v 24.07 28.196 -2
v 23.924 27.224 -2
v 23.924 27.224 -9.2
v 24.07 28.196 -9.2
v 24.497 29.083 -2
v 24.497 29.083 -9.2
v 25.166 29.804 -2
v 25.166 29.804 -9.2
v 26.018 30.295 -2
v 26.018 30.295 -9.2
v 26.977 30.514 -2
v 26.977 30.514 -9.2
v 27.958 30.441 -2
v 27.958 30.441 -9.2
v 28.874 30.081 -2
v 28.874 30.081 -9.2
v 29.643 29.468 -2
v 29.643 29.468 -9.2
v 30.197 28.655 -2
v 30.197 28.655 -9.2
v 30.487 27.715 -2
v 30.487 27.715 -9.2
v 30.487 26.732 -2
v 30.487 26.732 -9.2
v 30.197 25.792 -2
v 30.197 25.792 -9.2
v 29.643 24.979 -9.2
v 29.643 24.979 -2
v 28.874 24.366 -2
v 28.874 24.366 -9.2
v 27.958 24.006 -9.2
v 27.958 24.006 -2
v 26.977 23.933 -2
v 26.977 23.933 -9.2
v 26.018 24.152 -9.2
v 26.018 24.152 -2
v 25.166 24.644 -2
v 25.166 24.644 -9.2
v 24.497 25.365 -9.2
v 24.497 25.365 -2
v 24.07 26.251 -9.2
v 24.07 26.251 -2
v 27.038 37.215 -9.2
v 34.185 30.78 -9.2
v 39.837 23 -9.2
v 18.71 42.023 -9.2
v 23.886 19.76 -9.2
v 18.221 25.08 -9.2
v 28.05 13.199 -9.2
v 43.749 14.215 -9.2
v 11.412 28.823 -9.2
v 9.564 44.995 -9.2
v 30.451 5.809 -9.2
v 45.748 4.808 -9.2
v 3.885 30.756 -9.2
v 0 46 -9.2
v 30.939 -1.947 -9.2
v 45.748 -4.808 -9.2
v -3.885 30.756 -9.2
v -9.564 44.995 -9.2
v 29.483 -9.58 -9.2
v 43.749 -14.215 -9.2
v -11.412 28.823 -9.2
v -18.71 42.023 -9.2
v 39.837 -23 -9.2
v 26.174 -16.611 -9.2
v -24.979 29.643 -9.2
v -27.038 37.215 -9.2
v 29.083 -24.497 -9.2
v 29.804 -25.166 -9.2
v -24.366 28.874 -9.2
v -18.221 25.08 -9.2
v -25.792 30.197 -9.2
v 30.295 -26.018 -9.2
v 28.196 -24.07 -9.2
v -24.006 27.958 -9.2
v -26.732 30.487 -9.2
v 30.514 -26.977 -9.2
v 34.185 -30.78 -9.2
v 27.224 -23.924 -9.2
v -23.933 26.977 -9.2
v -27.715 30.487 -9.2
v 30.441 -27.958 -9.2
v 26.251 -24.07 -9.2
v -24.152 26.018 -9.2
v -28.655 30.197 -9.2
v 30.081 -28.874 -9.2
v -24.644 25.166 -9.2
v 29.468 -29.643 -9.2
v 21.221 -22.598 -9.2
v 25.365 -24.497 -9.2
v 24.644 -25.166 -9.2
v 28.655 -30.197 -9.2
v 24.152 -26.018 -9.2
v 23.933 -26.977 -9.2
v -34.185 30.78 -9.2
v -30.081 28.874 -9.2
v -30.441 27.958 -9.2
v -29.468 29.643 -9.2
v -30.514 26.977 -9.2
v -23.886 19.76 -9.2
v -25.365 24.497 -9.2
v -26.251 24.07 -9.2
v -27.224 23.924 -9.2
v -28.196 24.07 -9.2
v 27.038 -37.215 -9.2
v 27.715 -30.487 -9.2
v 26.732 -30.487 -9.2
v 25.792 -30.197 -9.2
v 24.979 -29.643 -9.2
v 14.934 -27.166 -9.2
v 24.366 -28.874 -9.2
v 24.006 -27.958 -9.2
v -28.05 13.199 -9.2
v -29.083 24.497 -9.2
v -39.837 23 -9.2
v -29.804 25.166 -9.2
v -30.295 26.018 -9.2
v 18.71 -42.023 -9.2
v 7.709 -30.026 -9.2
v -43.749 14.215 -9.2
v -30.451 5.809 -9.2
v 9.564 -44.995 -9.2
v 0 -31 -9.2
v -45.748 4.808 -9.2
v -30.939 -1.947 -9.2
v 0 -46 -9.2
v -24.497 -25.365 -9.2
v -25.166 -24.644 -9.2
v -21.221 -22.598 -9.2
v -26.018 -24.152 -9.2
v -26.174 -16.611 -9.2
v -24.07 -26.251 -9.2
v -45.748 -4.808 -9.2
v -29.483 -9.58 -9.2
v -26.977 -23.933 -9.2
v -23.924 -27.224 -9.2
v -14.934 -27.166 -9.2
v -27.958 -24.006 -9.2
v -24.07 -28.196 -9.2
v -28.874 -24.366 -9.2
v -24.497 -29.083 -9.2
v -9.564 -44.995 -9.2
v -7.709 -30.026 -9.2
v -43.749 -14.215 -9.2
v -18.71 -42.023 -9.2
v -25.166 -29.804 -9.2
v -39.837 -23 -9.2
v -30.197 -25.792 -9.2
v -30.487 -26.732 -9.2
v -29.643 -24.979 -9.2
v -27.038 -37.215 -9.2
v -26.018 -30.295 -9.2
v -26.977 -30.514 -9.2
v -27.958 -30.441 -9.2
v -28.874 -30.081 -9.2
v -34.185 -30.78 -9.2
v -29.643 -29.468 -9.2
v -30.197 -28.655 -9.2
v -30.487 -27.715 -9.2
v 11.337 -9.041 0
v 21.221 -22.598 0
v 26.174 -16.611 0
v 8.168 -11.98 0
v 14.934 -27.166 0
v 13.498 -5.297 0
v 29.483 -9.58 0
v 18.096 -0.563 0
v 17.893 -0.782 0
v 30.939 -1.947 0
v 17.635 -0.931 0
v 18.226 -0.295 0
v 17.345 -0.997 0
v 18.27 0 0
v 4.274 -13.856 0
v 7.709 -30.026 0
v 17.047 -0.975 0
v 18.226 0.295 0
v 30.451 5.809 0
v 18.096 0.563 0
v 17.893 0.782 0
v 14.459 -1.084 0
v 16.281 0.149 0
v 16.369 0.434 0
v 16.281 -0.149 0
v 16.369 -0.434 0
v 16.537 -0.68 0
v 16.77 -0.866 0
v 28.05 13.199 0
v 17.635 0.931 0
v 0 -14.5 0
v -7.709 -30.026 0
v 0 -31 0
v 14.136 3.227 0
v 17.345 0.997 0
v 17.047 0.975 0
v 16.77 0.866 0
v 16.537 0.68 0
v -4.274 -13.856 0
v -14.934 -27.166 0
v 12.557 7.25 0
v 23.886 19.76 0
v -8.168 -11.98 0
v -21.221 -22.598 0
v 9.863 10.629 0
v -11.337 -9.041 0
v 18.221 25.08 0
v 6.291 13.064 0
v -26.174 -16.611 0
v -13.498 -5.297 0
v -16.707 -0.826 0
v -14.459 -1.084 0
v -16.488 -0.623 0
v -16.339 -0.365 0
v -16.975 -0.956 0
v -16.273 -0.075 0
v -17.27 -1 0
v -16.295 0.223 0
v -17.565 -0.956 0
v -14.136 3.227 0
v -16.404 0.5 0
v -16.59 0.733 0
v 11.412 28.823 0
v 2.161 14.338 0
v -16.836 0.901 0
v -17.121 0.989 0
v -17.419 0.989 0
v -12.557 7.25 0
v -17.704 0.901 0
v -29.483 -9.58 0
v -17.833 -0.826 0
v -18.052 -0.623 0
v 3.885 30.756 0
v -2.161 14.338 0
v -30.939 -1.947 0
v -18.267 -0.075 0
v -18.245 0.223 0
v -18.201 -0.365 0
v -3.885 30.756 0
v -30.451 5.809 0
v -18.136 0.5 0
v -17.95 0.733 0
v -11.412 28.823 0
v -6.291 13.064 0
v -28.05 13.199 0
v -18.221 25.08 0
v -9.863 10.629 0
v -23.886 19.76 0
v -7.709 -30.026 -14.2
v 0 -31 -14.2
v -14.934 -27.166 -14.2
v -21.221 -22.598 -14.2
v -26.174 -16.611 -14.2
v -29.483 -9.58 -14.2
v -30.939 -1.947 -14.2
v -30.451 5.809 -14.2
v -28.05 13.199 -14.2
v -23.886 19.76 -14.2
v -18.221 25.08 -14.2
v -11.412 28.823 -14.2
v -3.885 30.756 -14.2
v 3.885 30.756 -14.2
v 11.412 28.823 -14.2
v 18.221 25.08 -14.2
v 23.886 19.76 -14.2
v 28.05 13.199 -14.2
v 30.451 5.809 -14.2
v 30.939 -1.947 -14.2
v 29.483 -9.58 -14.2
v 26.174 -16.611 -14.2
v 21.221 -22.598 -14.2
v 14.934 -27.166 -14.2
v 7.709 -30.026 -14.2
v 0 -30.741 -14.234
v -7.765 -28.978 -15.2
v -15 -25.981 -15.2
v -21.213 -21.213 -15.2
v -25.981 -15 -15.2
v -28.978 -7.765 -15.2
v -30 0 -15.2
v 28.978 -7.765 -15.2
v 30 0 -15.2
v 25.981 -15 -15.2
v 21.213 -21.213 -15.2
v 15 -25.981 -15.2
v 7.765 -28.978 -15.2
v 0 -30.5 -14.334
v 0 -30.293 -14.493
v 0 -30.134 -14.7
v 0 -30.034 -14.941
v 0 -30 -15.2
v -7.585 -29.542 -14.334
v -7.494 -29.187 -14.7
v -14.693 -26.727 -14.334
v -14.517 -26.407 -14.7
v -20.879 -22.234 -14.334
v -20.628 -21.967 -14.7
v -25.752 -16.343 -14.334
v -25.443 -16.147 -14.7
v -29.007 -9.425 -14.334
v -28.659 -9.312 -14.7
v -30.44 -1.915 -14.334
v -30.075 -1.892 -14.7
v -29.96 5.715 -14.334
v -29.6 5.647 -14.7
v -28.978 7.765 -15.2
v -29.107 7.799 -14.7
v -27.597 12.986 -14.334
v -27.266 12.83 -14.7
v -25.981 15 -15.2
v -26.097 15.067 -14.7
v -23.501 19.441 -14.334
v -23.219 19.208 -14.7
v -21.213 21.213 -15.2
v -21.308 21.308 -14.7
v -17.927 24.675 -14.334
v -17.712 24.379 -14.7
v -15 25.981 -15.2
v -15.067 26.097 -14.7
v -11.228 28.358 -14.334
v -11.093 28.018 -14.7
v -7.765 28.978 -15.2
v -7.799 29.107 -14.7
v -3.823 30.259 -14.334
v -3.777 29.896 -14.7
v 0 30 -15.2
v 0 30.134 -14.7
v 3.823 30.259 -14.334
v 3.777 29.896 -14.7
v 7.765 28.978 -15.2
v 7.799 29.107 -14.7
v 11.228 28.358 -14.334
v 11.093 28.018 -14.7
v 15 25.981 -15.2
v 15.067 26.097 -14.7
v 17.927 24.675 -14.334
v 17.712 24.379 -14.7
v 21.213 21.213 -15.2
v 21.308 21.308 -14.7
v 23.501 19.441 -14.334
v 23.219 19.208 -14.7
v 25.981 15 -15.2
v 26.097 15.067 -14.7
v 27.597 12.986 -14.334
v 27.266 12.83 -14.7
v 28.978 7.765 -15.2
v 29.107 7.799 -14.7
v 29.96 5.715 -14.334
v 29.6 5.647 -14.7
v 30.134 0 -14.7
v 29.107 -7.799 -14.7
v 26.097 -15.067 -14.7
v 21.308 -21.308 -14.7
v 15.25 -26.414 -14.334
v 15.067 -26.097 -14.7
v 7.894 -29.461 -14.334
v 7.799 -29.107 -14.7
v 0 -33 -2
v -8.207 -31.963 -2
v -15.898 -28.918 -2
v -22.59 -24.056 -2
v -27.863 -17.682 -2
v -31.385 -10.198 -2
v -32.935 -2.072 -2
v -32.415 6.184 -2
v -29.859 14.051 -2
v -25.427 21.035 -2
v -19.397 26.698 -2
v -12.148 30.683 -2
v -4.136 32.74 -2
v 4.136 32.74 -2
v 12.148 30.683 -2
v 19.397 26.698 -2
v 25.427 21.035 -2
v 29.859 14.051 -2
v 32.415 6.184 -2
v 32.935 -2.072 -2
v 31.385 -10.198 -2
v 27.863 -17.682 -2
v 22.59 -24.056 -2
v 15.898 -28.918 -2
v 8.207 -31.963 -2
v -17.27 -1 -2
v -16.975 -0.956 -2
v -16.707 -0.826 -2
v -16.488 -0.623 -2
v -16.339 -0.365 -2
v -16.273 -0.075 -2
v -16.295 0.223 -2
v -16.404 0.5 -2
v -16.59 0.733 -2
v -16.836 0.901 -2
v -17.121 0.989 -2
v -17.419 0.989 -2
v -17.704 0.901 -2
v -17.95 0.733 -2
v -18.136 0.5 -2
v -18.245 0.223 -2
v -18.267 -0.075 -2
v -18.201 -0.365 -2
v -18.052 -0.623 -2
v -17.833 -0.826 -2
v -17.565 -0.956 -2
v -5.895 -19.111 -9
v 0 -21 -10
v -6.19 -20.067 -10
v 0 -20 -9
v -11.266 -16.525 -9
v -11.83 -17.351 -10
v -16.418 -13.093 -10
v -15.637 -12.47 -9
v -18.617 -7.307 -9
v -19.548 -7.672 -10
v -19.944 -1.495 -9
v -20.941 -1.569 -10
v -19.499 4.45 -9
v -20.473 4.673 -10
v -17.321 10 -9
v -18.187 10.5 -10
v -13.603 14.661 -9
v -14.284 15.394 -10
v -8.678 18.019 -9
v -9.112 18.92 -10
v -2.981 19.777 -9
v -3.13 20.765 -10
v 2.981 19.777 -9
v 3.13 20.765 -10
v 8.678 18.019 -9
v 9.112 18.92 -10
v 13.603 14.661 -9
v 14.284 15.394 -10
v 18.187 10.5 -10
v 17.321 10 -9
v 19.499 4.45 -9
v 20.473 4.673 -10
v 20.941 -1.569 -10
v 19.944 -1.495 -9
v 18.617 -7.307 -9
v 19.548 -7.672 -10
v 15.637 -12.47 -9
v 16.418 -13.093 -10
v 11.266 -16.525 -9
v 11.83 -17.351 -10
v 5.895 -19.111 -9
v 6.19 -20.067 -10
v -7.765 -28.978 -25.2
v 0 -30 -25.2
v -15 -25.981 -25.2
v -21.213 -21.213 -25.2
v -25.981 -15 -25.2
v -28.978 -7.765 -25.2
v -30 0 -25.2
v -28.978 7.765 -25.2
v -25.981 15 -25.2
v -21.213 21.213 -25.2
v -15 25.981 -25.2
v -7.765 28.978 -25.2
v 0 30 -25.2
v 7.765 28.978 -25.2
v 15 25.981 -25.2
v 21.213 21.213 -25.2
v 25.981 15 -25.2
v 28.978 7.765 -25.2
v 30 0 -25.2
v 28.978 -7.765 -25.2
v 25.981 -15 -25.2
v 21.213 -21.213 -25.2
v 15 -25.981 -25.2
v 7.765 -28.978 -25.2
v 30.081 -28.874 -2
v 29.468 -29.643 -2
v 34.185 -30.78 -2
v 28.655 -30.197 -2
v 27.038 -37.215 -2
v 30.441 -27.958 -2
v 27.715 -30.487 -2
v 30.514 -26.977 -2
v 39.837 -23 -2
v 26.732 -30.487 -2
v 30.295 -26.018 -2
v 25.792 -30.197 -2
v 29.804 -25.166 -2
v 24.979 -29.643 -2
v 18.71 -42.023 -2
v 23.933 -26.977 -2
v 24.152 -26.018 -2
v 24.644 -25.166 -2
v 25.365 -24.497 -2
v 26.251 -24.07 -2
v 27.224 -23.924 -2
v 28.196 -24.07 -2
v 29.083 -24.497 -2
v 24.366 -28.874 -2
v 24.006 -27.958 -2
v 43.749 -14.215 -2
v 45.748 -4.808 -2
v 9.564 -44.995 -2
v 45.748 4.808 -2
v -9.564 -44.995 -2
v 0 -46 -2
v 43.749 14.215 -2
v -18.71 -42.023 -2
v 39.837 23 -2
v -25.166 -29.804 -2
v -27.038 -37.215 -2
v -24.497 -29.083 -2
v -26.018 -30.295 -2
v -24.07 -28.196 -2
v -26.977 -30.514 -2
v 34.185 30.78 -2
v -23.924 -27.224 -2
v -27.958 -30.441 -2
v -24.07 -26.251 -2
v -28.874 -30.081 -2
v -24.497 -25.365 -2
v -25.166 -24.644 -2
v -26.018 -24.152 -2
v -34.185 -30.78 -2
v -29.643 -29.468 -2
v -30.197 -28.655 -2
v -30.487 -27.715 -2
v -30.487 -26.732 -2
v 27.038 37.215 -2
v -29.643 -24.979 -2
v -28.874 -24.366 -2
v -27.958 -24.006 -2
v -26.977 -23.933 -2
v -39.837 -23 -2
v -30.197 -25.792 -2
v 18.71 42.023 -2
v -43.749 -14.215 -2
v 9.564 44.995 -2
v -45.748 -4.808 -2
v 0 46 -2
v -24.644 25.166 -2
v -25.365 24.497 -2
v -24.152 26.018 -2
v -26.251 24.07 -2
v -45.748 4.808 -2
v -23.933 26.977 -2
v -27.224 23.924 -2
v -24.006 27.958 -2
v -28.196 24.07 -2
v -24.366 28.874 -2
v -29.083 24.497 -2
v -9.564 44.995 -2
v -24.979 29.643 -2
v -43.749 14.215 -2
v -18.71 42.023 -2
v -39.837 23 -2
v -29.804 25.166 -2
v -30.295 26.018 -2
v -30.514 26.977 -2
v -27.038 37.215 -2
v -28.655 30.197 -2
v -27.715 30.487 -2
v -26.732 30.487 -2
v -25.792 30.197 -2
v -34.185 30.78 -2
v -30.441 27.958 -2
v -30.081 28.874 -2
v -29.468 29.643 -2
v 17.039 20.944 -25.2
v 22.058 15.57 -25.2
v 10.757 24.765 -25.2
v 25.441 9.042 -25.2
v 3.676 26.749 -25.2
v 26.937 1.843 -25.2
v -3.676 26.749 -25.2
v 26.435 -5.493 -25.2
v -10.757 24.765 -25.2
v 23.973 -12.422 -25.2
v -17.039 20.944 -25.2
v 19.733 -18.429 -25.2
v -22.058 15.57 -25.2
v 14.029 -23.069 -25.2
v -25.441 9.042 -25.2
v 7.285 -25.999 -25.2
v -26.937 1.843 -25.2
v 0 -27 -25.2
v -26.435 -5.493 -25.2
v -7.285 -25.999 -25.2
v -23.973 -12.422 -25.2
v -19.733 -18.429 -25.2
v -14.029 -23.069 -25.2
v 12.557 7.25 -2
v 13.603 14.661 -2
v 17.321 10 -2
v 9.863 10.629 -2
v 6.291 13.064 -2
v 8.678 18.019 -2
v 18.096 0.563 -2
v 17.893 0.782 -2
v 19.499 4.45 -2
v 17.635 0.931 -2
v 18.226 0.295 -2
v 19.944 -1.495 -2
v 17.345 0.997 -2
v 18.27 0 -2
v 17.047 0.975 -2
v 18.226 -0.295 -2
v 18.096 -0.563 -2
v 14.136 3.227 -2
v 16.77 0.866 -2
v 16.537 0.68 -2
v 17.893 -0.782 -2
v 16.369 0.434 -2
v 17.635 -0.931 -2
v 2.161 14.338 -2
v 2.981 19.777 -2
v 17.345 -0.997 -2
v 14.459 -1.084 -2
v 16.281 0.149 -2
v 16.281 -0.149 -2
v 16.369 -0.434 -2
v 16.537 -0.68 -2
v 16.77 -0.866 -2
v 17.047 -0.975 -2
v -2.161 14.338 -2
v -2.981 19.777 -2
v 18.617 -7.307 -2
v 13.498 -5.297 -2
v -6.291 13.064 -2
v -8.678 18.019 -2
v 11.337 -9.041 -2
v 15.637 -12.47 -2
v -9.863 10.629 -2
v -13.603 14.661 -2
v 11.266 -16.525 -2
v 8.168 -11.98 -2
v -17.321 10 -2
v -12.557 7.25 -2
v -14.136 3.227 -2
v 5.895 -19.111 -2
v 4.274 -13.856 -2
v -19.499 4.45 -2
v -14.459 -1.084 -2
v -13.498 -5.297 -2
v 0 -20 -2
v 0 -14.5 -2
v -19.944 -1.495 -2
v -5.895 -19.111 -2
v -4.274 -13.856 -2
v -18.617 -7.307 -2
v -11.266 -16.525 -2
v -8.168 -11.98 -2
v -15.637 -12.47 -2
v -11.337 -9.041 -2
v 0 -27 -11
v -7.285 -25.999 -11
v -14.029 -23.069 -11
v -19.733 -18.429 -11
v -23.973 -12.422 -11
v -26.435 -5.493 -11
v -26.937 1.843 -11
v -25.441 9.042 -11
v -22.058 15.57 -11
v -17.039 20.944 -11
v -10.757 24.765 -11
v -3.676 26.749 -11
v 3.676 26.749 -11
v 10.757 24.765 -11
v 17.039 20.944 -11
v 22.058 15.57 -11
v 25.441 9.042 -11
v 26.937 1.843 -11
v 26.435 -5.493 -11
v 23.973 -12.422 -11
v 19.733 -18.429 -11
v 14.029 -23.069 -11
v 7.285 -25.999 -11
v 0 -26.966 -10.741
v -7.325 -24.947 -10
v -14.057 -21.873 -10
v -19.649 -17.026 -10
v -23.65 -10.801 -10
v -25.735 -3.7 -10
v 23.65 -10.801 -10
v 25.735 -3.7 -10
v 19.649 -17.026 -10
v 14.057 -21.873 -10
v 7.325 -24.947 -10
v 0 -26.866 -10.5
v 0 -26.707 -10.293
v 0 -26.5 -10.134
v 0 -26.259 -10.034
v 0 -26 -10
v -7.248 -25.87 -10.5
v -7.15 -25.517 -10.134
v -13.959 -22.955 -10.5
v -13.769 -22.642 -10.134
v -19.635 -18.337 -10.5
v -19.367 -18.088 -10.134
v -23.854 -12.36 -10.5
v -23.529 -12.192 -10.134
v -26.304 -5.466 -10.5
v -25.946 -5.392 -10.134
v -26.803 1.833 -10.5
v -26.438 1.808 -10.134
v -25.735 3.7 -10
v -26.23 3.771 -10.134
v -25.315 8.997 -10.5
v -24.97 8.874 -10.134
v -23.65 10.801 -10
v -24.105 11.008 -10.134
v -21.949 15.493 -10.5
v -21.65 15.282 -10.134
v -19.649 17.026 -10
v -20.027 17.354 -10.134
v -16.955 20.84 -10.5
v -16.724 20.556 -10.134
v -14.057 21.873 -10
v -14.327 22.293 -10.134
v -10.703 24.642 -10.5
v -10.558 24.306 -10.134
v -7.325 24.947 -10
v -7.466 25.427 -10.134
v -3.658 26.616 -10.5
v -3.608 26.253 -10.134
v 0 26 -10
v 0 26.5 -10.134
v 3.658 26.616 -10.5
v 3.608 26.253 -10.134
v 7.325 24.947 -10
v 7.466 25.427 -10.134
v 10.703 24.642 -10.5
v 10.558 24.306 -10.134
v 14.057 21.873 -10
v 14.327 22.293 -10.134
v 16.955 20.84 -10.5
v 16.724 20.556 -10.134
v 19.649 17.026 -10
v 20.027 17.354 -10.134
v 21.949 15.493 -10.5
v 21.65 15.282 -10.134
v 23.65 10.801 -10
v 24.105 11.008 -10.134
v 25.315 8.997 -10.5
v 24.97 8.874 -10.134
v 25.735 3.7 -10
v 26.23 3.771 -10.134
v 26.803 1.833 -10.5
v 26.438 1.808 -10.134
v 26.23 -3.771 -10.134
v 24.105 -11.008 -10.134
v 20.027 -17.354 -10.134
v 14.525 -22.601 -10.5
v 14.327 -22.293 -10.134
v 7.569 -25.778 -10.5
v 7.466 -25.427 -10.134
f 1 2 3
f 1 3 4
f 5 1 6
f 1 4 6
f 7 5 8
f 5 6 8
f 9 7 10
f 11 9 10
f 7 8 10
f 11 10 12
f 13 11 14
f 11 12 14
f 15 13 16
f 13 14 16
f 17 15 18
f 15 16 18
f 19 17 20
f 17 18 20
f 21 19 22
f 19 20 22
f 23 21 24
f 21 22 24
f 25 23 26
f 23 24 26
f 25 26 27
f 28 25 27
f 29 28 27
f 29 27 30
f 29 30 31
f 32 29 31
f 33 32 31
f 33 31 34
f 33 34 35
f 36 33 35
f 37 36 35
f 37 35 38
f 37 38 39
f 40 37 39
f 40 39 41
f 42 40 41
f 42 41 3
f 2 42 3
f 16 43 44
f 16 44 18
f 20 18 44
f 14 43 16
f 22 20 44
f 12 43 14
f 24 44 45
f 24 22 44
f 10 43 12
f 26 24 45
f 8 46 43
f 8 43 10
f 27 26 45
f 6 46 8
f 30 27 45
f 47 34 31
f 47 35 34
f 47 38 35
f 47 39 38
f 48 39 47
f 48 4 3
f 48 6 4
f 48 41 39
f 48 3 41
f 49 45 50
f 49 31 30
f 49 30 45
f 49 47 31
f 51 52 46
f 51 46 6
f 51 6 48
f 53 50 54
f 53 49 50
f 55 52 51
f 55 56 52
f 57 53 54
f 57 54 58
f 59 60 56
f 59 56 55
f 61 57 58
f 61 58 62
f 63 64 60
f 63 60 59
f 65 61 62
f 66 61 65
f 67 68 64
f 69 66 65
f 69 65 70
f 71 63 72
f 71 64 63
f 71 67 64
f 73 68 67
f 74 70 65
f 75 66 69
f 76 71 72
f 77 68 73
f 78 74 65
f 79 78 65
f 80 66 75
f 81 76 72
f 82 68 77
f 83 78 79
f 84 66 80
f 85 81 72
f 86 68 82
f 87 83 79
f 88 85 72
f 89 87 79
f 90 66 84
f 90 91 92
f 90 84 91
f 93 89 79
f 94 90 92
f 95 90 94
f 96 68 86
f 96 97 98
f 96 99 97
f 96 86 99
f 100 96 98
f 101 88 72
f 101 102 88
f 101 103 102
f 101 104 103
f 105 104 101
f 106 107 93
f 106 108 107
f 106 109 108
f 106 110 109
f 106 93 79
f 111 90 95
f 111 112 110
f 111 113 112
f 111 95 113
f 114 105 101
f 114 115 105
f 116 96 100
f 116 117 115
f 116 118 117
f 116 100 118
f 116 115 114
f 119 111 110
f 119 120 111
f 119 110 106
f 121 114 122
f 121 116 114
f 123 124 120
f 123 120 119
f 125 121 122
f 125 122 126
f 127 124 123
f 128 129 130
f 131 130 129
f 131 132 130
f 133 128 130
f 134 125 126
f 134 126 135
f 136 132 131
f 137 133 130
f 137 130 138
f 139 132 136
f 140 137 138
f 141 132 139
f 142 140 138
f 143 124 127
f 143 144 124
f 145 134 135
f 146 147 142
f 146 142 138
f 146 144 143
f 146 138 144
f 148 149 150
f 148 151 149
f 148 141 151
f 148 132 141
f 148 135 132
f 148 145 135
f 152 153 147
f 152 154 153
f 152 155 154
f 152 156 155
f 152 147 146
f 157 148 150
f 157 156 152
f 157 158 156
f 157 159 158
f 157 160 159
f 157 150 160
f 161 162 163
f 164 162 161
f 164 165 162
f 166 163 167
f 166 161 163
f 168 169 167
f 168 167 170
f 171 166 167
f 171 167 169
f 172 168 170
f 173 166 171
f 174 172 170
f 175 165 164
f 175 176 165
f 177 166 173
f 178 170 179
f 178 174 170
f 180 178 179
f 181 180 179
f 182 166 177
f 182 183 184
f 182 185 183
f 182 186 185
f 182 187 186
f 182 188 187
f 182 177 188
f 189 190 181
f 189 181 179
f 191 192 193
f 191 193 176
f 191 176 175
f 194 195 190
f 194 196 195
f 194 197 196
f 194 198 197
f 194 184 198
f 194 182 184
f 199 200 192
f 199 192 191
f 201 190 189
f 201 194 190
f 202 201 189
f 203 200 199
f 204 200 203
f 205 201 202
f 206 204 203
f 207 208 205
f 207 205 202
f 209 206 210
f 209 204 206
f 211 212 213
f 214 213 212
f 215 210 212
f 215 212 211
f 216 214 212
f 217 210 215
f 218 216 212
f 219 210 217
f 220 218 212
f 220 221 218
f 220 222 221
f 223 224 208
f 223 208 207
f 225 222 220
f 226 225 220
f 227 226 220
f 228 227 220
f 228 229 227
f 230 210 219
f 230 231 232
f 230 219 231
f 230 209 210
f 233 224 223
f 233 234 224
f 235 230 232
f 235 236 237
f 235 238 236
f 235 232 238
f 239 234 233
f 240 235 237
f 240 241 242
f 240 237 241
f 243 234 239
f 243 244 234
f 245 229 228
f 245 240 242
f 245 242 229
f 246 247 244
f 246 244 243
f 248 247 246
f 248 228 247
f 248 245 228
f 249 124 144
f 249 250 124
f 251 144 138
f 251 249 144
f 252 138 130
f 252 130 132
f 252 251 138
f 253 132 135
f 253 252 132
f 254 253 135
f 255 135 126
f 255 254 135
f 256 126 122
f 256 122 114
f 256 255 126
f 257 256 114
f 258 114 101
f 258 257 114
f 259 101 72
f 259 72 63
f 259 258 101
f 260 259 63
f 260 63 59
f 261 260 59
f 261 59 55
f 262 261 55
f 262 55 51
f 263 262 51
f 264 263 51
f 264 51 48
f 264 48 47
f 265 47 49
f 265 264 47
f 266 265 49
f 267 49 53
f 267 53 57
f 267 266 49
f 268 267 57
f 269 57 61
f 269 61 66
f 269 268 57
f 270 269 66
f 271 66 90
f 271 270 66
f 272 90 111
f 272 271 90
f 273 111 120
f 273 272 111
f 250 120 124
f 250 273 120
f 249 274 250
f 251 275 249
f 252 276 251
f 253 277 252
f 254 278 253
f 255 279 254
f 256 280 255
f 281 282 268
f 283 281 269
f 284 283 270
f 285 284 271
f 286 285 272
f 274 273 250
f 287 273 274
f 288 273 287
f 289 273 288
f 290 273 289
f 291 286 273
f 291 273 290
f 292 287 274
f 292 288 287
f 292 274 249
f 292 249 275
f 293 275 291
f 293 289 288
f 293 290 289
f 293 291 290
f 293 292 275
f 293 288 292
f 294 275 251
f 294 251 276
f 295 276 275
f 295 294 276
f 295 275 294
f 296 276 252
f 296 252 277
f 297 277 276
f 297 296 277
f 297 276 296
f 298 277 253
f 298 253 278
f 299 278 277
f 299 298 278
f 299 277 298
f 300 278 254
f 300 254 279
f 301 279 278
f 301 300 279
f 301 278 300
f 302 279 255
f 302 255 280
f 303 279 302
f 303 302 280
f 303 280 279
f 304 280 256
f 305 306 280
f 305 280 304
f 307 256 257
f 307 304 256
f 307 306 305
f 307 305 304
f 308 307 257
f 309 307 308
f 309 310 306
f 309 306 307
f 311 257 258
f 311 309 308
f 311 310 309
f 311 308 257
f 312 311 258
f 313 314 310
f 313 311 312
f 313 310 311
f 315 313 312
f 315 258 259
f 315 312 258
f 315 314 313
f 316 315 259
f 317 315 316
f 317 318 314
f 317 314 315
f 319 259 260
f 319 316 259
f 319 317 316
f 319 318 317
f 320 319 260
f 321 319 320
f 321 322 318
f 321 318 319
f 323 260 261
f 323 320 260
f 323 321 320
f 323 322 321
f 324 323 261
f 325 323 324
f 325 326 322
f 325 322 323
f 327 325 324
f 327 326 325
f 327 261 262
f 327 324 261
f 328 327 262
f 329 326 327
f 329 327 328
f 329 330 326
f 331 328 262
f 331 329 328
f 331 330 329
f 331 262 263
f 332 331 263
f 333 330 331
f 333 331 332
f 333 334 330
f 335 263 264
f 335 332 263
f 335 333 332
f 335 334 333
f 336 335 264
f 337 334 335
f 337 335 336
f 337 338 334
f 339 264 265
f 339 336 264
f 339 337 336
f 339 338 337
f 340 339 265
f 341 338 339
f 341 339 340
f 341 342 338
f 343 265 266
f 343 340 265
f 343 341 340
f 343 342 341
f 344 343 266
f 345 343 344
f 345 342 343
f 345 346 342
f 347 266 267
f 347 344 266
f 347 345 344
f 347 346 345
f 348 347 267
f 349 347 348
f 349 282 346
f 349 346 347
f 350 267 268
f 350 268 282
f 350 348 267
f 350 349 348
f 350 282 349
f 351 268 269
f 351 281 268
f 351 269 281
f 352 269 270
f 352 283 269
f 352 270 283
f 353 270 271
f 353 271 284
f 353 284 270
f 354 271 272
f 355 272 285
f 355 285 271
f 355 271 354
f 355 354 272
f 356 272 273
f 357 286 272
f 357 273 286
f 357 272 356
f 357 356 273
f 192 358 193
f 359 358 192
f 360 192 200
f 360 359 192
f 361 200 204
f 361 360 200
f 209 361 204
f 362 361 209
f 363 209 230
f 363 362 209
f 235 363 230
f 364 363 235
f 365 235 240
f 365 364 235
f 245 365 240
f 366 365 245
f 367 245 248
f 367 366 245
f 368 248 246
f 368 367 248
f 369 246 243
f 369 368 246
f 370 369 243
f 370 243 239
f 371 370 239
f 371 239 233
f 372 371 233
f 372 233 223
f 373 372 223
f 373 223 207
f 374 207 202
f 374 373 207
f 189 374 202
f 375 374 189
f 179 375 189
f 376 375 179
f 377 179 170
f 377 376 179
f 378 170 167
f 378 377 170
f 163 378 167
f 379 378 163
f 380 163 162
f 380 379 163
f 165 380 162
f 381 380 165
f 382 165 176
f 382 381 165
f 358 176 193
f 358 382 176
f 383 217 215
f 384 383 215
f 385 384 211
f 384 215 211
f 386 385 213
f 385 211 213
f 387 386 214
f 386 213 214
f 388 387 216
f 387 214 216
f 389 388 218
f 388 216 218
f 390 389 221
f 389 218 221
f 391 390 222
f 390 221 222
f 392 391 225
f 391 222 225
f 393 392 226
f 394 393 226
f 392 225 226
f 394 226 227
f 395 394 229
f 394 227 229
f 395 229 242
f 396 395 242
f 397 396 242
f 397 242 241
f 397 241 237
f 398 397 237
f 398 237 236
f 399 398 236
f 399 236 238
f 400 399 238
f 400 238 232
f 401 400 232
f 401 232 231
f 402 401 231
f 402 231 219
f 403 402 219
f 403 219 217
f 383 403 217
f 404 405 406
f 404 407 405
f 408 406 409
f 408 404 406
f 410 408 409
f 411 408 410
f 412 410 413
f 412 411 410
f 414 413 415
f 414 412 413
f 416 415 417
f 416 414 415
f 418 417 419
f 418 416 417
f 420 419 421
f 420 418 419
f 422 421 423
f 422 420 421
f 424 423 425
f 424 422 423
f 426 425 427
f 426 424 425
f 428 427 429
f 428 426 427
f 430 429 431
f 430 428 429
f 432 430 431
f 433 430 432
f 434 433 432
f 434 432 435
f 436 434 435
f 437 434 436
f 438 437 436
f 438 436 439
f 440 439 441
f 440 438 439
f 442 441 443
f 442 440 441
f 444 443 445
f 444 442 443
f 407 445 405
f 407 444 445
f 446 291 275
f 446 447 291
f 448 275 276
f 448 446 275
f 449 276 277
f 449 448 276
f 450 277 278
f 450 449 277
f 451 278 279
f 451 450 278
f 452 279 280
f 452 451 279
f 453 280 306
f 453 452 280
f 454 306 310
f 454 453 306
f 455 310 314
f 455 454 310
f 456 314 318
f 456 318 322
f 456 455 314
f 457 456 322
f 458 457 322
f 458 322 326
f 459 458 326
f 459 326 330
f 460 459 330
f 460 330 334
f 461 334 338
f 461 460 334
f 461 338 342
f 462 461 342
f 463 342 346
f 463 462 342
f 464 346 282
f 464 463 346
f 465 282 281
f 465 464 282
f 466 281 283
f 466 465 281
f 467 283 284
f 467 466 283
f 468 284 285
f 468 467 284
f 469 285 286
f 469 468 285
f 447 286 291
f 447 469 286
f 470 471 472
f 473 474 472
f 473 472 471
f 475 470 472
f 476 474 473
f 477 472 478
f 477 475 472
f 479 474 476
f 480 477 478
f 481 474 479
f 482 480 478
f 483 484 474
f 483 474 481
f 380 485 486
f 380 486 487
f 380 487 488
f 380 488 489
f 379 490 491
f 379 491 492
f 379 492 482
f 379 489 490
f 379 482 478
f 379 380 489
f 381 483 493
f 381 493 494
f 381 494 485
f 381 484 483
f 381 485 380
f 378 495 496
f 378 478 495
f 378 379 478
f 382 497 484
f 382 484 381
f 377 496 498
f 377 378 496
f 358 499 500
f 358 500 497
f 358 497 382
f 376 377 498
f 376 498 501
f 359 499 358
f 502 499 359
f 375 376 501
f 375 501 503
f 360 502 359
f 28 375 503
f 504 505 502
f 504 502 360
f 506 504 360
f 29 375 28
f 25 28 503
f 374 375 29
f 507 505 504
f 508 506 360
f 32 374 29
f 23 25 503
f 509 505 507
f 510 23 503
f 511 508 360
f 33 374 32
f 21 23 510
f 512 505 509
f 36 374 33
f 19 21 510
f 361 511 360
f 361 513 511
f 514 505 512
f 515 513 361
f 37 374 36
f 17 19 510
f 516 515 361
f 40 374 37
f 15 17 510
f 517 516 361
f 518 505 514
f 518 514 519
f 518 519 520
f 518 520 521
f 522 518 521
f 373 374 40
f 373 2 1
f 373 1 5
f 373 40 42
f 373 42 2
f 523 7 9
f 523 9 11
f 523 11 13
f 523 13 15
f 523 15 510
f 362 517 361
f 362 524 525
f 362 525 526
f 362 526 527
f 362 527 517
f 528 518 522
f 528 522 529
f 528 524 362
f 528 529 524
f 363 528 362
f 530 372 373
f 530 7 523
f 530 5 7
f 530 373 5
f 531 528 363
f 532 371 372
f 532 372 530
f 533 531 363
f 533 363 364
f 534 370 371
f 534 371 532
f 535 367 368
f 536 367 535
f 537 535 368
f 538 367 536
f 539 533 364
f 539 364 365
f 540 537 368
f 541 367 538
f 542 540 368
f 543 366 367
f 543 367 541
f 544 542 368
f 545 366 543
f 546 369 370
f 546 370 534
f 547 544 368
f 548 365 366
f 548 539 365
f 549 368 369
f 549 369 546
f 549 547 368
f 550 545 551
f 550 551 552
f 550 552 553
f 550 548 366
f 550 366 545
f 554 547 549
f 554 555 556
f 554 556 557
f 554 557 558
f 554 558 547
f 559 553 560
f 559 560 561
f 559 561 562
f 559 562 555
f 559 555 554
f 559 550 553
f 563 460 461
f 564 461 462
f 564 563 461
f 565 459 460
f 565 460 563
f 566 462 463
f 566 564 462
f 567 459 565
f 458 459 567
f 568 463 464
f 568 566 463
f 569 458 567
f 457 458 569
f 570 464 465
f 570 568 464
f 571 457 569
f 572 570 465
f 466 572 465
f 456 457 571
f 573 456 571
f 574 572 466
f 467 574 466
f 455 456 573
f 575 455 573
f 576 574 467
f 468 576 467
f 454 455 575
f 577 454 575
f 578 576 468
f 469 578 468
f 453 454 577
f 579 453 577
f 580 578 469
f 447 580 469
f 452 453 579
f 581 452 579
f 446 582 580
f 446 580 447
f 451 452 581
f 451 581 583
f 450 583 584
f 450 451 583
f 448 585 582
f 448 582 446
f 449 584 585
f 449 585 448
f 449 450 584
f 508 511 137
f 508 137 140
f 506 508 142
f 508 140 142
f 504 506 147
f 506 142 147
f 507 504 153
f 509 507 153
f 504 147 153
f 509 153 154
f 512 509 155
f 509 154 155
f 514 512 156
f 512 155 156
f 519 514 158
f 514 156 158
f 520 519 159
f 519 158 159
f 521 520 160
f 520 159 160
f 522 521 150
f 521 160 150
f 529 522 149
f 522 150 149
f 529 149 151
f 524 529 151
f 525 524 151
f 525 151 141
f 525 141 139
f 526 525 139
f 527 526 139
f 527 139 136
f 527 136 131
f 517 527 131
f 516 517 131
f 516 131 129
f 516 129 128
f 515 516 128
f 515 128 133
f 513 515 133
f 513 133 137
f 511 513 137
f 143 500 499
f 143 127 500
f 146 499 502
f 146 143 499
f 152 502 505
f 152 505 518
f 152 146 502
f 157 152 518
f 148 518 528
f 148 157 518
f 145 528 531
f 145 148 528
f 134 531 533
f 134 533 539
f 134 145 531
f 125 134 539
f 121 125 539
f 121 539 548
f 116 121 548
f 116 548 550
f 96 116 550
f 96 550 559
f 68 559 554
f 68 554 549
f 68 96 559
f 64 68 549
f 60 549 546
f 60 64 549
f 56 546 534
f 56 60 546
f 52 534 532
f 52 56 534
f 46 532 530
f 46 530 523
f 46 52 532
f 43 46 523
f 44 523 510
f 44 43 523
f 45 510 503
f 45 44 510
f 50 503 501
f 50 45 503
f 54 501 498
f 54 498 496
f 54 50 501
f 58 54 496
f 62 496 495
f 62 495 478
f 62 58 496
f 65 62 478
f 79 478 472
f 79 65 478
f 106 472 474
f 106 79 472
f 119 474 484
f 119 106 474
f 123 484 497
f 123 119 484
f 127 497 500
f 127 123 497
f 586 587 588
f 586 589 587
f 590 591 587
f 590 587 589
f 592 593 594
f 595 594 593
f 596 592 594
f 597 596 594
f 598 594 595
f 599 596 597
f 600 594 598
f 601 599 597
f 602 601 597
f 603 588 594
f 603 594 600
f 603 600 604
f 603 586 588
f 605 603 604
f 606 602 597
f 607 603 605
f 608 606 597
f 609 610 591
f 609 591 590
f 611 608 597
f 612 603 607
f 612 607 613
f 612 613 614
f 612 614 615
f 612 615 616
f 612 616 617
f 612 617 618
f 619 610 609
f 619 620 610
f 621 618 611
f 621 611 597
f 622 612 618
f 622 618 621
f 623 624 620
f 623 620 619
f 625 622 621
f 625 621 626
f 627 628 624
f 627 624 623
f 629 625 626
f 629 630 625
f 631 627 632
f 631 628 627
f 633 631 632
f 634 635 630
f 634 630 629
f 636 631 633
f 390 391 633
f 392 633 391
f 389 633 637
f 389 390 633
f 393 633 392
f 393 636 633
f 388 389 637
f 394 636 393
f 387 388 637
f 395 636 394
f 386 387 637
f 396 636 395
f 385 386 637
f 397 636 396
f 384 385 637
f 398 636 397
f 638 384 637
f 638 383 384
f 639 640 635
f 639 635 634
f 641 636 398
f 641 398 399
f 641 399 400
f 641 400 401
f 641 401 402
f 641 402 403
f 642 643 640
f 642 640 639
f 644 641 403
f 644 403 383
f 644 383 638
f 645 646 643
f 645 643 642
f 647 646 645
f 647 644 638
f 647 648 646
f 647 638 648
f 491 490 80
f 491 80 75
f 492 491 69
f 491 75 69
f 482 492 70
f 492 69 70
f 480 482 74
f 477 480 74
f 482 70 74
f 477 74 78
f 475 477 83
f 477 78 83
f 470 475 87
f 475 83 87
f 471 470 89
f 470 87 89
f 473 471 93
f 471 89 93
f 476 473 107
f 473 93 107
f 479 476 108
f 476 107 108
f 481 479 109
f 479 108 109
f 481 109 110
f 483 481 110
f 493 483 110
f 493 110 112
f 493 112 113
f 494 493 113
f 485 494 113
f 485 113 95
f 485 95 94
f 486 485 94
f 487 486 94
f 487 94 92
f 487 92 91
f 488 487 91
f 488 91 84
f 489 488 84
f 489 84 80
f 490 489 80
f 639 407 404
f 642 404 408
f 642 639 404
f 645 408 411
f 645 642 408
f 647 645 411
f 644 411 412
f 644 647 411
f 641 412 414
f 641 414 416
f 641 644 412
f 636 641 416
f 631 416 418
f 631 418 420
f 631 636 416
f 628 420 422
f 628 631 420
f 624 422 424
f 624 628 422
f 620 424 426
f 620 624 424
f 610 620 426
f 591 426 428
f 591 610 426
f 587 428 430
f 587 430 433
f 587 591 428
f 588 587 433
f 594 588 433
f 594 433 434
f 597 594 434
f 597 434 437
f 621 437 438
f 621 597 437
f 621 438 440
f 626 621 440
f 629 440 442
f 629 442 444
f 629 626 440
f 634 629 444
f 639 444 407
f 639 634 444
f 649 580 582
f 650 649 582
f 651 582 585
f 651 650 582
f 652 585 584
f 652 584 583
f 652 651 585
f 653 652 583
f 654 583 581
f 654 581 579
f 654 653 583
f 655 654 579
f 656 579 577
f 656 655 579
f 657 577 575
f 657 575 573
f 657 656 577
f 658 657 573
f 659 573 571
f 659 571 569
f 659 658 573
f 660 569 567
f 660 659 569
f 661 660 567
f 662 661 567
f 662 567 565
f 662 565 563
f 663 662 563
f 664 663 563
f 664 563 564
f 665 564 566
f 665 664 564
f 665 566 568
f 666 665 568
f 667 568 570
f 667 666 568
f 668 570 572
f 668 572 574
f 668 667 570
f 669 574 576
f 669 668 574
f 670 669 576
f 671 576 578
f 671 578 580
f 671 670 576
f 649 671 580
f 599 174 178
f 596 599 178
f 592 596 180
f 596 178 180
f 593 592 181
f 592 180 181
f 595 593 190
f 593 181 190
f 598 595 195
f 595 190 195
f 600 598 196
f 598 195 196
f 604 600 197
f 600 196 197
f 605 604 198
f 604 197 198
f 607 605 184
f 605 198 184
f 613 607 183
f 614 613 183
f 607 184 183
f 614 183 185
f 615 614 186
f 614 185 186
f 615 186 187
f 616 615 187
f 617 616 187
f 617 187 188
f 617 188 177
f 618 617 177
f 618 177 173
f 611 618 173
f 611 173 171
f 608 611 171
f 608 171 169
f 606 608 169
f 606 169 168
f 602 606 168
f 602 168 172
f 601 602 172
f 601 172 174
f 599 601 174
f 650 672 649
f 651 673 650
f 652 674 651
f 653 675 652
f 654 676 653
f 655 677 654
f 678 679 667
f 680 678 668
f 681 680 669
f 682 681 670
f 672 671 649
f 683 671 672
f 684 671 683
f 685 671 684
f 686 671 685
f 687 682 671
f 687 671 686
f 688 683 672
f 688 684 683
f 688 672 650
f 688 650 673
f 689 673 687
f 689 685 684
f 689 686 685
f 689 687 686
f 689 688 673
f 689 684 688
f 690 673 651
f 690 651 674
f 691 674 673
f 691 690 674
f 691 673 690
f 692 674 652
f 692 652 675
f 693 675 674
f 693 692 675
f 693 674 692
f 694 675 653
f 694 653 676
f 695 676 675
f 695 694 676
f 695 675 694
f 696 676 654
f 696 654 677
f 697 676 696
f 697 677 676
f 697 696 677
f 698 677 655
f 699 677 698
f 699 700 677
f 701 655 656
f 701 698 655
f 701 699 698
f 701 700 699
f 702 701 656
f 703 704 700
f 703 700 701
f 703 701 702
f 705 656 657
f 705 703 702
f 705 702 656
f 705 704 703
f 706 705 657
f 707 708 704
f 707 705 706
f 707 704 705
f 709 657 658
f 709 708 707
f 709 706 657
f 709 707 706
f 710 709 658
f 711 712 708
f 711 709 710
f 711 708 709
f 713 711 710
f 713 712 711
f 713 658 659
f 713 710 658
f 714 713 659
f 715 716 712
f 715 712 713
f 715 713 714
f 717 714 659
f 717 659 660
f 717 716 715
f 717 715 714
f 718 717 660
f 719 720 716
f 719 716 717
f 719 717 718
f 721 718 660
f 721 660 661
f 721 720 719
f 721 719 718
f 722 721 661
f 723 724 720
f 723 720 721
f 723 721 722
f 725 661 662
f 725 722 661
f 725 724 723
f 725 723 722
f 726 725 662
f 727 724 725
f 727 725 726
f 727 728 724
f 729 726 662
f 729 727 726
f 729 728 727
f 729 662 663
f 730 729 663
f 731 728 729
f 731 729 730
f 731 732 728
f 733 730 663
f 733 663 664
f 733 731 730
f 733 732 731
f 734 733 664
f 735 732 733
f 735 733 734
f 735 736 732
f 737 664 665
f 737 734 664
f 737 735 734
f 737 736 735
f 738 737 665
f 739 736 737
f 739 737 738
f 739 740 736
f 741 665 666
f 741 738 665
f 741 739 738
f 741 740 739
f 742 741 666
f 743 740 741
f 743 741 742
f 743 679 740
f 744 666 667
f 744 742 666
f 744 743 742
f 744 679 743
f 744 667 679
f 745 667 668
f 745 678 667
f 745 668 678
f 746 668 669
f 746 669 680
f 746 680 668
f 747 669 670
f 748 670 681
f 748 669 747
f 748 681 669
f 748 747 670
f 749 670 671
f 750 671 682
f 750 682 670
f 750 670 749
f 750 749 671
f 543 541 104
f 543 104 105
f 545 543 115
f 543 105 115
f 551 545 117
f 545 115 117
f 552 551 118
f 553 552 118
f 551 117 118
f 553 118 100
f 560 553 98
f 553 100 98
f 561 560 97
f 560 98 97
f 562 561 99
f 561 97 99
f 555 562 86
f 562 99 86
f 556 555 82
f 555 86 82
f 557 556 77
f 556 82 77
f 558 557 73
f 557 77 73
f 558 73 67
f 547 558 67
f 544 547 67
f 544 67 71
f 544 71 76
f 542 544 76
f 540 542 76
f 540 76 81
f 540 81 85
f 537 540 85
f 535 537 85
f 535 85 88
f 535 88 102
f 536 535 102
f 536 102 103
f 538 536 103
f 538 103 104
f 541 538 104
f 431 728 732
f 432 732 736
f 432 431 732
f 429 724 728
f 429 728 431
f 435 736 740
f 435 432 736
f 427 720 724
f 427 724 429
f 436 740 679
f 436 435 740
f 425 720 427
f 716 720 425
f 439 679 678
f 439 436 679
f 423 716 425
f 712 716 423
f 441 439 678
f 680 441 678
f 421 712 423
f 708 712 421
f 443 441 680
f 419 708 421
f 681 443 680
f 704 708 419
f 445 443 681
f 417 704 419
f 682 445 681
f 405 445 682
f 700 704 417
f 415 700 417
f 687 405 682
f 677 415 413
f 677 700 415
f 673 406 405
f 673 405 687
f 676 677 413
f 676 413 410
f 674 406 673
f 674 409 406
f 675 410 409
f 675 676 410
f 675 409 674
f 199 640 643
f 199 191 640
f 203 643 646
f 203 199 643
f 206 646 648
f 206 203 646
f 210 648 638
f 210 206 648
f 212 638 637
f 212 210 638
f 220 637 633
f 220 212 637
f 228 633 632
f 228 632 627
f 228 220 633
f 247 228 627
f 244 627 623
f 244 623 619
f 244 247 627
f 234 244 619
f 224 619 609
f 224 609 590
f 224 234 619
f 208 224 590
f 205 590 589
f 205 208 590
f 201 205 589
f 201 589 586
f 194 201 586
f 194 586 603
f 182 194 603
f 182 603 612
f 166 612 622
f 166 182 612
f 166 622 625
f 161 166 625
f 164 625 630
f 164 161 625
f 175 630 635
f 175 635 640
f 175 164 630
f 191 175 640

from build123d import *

# Parameters (mm, degrees)
M6_CLEARANCE_HOLE1_D = 6.6
CIRPATTERN1_COUNT    = 4
CUT_EXTRUDE1_REACH   = 71.764
SKETCH5_R            = 1


with BuildPart() as part:
    # Sketch1 → Revolve1 (revolve)
    with BuildSketch(Plane(origin=(0, 0, 0), x_dir=(0, 0, -1), z_dir=(1, 0, 0)), mode=Mode.PRIVATE) as revolve1_sk:
        with BuildLine():
            Line((0, 14.5), (0, 31))
            Line((0, 31), (2, 33))
            Line((2, 33), (2, 46))
            Line((2, 46), (9.2, 46))
            Line((9.2, 46), (9.2, 31))
            Line((9.2, 31), (14.2, 31))
            ThreePointArc((14.2, 31), (14.492893219, 30.292893219), (15.2, 30))
            Line((15.2, 30), (25.2, 30))
            Line((25.2, 30), (25.2, 27))
            Line((25.2, 27), (11, 27))
            ThreePointArc((11, 27), (10.292893219, 26.707106781), (10, 26))
            Line((10, 26), (10, 21))
            Line((10, 21), (9, 20))
            Line((9, 20), (2, 20))
            Line((2, 20), (2, 14.5))
            Line((2, 14.5), (0, 14.5))
        make_face()
    revolve(revolve1_sk.sketch.rotate(Axis((0, 0, 0), (0, 0, -1)), 180), axis=Axis((0, 0, 0), (0, 0, -1)))

    # M6 Clearance Hole1 (through all)
    with Locations(Plane.XY.offset(-2)):
        with Locations((27.223611076, 27.223611076)):
            m6_clearance_hole1 = Hole(M6_CLEARANCE_HOLE1_D / 2)

    # CirPattern1: M6 Clearance Hole1 ×4 about axis
    cirpattern1_axis = Axis((0, 0, 0), (0, 0, 1))
    for i in range(1, CIRPATTERN1_COUNT):
        add(m6_clearance_hole1.rotate(cirpattern1_axis, i * 360 / CIRPATTERN1_COUNT), mode=Mode.SUBTRACT)

    # Sketch5 → Cut-Extrude1 (cut, up to next)
    with BuildSketch(Plane.XY, mode=Mode.PRIVATE) as cut_extrude1_sk1:
        with Locations((17.27, 0)):
            Circle(SKETCH5_R)
    cut_extrude1_tool1 = extrude(cut_extrude1_sk1.sketch, amount=-CUT_EXTRUDE1_REACH, mode=Mode.PRIVATE) & part.part
    # Sketch5 → Cut-Extrude1 (cut, up to next)
    with BuildSketch(Plane.XY, mode=Mode.PRIVATE) as cut_extrude1_sk2:
        with Locations(Location((-17.27, 0, 0), (0, 0, 270))):
            Circle(SKETCH5_R)
    cut_extrude1_tool2 = extrude(cut_extrude1_sk2.sketch, amount=-CUT_EXTRUDE1_REACH, mode=Mode.PRIVATE) & part.part
    add(cut_extrude1_tool1.solids().sort_by_distance((17.27, 0, 0))[0], mode=Mode.SUBTRACT)
    add(cut_extrude1_tool2.solids().sort_by_distance((-17.27, 0, 0))[0], mode=Mode.SUBTRACT)


solid = part.part
